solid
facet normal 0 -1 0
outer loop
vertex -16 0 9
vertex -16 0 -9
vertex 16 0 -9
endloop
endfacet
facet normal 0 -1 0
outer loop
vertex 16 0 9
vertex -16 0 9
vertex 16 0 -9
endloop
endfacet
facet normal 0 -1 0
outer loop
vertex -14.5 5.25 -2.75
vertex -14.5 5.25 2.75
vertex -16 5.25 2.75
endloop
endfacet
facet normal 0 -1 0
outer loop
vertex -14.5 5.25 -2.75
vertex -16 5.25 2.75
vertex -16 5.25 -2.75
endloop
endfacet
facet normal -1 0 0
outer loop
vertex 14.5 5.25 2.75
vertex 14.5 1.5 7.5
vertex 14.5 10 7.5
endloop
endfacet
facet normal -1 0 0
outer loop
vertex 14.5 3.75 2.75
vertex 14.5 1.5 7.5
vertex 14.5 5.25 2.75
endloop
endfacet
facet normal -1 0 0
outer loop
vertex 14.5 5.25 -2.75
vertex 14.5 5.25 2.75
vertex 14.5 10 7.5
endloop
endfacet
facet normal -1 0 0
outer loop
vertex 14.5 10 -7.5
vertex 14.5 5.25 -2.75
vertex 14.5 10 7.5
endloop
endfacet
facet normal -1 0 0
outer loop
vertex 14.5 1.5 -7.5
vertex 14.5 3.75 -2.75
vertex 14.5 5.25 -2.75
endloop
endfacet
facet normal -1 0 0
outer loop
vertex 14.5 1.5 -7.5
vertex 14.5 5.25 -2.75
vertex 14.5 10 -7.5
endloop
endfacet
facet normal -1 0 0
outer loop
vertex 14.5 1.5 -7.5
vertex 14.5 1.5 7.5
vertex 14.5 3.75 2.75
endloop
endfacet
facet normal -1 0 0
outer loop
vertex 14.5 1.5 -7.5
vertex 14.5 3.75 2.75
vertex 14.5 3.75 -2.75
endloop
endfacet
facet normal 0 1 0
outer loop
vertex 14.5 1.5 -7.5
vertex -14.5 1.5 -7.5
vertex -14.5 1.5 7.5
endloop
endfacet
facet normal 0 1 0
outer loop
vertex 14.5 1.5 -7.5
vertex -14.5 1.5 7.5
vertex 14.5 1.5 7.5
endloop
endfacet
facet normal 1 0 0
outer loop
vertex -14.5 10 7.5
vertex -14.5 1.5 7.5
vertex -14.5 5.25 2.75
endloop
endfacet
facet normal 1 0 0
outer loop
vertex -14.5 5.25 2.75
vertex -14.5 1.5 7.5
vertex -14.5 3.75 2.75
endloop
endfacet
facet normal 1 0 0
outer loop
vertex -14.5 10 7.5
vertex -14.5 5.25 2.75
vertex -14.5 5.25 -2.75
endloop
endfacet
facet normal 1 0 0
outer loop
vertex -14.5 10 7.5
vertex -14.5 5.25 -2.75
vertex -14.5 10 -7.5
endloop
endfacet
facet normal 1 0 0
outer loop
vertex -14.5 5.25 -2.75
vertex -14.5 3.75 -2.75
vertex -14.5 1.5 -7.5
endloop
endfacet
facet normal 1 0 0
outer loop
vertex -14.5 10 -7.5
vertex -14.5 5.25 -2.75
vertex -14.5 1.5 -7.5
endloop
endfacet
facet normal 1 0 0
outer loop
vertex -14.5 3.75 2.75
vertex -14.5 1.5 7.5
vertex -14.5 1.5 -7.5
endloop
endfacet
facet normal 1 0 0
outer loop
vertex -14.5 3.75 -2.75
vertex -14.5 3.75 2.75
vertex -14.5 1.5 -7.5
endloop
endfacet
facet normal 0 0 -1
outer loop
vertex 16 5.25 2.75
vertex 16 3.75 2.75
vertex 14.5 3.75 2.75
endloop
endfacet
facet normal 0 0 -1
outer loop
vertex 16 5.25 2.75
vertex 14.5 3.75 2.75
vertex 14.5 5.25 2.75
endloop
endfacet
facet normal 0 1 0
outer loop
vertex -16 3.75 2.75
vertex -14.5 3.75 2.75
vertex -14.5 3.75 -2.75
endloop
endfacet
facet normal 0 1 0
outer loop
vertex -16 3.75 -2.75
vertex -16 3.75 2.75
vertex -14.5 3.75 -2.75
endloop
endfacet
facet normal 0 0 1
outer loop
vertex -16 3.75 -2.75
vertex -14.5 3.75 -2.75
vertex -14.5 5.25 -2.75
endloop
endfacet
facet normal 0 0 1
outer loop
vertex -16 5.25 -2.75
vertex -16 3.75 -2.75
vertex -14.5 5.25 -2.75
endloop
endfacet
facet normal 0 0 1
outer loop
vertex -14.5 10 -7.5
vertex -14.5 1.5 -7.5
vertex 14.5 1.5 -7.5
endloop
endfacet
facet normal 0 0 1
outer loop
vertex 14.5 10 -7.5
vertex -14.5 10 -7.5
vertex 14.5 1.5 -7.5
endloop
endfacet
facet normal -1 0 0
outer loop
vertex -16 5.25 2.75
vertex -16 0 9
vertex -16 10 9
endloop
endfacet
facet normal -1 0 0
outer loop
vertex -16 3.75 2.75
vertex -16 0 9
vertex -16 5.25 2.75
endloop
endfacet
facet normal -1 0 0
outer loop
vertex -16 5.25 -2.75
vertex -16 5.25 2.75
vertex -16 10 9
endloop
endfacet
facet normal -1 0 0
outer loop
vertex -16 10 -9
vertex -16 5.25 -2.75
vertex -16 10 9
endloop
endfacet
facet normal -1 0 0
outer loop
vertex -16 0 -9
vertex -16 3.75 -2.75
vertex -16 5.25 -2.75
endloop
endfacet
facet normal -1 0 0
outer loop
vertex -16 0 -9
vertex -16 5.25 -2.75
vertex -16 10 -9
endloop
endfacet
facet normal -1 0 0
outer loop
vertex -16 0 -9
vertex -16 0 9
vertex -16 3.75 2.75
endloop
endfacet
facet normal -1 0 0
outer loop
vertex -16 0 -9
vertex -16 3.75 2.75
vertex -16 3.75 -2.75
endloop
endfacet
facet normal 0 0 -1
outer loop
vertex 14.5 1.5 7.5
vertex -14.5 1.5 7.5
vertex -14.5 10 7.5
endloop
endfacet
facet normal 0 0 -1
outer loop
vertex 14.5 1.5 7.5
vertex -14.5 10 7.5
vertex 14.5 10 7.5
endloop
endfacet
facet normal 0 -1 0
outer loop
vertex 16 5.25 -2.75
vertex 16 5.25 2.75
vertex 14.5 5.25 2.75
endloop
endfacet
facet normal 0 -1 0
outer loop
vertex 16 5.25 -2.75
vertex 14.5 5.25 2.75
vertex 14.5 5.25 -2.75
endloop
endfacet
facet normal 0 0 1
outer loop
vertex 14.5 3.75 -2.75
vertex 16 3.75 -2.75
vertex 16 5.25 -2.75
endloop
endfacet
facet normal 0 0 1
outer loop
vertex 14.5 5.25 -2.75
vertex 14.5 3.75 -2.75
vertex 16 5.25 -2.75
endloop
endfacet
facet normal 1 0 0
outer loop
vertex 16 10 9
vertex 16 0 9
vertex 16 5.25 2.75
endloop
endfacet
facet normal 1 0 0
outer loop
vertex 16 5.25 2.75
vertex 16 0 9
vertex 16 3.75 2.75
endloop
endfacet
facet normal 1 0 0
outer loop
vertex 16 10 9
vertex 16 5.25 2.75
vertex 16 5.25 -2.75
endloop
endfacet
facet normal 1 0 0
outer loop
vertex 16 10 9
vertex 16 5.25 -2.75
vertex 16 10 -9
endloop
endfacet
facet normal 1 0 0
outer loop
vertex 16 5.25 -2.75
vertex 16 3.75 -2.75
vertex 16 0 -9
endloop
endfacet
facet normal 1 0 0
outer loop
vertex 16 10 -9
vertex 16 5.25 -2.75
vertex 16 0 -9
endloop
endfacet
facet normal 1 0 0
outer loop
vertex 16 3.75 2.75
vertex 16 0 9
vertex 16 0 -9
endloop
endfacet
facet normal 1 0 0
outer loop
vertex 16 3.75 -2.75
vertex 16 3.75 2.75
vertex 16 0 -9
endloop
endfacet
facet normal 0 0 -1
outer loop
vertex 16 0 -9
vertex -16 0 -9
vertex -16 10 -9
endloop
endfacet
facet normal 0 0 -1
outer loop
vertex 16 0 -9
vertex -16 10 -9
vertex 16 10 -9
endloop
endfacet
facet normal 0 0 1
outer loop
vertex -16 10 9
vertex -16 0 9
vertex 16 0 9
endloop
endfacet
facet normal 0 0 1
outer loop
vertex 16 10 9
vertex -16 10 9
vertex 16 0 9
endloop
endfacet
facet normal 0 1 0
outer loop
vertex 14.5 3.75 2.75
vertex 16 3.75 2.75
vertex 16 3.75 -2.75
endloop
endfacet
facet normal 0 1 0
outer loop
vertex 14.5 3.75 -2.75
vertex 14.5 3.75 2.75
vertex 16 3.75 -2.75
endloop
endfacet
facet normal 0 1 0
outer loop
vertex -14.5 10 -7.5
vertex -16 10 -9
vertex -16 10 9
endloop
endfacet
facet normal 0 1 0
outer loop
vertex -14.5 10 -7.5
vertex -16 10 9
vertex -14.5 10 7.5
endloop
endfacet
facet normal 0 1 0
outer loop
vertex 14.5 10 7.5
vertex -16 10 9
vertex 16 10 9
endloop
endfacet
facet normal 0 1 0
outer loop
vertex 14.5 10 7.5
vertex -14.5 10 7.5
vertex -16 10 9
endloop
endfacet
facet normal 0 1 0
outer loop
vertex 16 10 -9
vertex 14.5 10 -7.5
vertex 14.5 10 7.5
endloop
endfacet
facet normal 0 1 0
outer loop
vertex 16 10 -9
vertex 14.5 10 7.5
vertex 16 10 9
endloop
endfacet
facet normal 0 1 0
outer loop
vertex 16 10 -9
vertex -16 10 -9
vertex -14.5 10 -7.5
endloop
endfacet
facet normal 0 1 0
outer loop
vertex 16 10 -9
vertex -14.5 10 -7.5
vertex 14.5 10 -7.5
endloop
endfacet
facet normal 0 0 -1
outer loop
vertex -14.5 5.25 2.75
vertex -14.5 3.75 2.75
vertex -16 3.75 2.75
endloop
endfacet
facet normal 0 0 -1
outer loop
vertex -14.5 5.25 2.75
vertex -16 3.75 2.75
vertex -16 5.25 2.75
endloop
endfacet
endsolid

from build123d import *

# Parameters (mm, degrees)
SKETCH1_W           = 32
SKETCH1_H           = 18
BOSS_EXTRUDE1_DEPTH = 10
SHELL1_T            = -1.5
SKETCH3_W           = 5.5
SKETCH3_H           = 1.5
CUT_EXTRUDE1_DEPTH  = 35.713109915


with BuildPart() as part:
    # Sketch1 → Boss-Extrude1 (new body)
    with BuildSketch(Plane(origin=(0, 0, 0), x_dir=(1, 0, 0), z_dir=(0, 1, 0))):
        Rectangle(SKETCH1_W, SKETCH1_H)
    extrude(amount=BOSS_EXTRUDE1_DEPTH)

    # Shell1
    shell1_openings = [part.faces().sort_by_distance(p)[0] for p in [
        (0, 10, 0),
    ]]
    offset(amount=SHELL1_T, openings=shell1_openings, kind=Kind.INTERSECTION)

    # Sketch3 → Cut-Extrude1 (cut, through all)
    with BuildSketch(Plane(origin=(16, 0, 0), x_dir=(0, 0, -1), z_dir=(1, 0, 0))):
        with Locations((0, 4.5)):
            Rectangle(SKETCH3_W, SKETCH3_H)
    extrude(amount=-CUT_EXTRUDE1_DEPTH, mode=Mode.SUBTRACT)


solid = part.part
